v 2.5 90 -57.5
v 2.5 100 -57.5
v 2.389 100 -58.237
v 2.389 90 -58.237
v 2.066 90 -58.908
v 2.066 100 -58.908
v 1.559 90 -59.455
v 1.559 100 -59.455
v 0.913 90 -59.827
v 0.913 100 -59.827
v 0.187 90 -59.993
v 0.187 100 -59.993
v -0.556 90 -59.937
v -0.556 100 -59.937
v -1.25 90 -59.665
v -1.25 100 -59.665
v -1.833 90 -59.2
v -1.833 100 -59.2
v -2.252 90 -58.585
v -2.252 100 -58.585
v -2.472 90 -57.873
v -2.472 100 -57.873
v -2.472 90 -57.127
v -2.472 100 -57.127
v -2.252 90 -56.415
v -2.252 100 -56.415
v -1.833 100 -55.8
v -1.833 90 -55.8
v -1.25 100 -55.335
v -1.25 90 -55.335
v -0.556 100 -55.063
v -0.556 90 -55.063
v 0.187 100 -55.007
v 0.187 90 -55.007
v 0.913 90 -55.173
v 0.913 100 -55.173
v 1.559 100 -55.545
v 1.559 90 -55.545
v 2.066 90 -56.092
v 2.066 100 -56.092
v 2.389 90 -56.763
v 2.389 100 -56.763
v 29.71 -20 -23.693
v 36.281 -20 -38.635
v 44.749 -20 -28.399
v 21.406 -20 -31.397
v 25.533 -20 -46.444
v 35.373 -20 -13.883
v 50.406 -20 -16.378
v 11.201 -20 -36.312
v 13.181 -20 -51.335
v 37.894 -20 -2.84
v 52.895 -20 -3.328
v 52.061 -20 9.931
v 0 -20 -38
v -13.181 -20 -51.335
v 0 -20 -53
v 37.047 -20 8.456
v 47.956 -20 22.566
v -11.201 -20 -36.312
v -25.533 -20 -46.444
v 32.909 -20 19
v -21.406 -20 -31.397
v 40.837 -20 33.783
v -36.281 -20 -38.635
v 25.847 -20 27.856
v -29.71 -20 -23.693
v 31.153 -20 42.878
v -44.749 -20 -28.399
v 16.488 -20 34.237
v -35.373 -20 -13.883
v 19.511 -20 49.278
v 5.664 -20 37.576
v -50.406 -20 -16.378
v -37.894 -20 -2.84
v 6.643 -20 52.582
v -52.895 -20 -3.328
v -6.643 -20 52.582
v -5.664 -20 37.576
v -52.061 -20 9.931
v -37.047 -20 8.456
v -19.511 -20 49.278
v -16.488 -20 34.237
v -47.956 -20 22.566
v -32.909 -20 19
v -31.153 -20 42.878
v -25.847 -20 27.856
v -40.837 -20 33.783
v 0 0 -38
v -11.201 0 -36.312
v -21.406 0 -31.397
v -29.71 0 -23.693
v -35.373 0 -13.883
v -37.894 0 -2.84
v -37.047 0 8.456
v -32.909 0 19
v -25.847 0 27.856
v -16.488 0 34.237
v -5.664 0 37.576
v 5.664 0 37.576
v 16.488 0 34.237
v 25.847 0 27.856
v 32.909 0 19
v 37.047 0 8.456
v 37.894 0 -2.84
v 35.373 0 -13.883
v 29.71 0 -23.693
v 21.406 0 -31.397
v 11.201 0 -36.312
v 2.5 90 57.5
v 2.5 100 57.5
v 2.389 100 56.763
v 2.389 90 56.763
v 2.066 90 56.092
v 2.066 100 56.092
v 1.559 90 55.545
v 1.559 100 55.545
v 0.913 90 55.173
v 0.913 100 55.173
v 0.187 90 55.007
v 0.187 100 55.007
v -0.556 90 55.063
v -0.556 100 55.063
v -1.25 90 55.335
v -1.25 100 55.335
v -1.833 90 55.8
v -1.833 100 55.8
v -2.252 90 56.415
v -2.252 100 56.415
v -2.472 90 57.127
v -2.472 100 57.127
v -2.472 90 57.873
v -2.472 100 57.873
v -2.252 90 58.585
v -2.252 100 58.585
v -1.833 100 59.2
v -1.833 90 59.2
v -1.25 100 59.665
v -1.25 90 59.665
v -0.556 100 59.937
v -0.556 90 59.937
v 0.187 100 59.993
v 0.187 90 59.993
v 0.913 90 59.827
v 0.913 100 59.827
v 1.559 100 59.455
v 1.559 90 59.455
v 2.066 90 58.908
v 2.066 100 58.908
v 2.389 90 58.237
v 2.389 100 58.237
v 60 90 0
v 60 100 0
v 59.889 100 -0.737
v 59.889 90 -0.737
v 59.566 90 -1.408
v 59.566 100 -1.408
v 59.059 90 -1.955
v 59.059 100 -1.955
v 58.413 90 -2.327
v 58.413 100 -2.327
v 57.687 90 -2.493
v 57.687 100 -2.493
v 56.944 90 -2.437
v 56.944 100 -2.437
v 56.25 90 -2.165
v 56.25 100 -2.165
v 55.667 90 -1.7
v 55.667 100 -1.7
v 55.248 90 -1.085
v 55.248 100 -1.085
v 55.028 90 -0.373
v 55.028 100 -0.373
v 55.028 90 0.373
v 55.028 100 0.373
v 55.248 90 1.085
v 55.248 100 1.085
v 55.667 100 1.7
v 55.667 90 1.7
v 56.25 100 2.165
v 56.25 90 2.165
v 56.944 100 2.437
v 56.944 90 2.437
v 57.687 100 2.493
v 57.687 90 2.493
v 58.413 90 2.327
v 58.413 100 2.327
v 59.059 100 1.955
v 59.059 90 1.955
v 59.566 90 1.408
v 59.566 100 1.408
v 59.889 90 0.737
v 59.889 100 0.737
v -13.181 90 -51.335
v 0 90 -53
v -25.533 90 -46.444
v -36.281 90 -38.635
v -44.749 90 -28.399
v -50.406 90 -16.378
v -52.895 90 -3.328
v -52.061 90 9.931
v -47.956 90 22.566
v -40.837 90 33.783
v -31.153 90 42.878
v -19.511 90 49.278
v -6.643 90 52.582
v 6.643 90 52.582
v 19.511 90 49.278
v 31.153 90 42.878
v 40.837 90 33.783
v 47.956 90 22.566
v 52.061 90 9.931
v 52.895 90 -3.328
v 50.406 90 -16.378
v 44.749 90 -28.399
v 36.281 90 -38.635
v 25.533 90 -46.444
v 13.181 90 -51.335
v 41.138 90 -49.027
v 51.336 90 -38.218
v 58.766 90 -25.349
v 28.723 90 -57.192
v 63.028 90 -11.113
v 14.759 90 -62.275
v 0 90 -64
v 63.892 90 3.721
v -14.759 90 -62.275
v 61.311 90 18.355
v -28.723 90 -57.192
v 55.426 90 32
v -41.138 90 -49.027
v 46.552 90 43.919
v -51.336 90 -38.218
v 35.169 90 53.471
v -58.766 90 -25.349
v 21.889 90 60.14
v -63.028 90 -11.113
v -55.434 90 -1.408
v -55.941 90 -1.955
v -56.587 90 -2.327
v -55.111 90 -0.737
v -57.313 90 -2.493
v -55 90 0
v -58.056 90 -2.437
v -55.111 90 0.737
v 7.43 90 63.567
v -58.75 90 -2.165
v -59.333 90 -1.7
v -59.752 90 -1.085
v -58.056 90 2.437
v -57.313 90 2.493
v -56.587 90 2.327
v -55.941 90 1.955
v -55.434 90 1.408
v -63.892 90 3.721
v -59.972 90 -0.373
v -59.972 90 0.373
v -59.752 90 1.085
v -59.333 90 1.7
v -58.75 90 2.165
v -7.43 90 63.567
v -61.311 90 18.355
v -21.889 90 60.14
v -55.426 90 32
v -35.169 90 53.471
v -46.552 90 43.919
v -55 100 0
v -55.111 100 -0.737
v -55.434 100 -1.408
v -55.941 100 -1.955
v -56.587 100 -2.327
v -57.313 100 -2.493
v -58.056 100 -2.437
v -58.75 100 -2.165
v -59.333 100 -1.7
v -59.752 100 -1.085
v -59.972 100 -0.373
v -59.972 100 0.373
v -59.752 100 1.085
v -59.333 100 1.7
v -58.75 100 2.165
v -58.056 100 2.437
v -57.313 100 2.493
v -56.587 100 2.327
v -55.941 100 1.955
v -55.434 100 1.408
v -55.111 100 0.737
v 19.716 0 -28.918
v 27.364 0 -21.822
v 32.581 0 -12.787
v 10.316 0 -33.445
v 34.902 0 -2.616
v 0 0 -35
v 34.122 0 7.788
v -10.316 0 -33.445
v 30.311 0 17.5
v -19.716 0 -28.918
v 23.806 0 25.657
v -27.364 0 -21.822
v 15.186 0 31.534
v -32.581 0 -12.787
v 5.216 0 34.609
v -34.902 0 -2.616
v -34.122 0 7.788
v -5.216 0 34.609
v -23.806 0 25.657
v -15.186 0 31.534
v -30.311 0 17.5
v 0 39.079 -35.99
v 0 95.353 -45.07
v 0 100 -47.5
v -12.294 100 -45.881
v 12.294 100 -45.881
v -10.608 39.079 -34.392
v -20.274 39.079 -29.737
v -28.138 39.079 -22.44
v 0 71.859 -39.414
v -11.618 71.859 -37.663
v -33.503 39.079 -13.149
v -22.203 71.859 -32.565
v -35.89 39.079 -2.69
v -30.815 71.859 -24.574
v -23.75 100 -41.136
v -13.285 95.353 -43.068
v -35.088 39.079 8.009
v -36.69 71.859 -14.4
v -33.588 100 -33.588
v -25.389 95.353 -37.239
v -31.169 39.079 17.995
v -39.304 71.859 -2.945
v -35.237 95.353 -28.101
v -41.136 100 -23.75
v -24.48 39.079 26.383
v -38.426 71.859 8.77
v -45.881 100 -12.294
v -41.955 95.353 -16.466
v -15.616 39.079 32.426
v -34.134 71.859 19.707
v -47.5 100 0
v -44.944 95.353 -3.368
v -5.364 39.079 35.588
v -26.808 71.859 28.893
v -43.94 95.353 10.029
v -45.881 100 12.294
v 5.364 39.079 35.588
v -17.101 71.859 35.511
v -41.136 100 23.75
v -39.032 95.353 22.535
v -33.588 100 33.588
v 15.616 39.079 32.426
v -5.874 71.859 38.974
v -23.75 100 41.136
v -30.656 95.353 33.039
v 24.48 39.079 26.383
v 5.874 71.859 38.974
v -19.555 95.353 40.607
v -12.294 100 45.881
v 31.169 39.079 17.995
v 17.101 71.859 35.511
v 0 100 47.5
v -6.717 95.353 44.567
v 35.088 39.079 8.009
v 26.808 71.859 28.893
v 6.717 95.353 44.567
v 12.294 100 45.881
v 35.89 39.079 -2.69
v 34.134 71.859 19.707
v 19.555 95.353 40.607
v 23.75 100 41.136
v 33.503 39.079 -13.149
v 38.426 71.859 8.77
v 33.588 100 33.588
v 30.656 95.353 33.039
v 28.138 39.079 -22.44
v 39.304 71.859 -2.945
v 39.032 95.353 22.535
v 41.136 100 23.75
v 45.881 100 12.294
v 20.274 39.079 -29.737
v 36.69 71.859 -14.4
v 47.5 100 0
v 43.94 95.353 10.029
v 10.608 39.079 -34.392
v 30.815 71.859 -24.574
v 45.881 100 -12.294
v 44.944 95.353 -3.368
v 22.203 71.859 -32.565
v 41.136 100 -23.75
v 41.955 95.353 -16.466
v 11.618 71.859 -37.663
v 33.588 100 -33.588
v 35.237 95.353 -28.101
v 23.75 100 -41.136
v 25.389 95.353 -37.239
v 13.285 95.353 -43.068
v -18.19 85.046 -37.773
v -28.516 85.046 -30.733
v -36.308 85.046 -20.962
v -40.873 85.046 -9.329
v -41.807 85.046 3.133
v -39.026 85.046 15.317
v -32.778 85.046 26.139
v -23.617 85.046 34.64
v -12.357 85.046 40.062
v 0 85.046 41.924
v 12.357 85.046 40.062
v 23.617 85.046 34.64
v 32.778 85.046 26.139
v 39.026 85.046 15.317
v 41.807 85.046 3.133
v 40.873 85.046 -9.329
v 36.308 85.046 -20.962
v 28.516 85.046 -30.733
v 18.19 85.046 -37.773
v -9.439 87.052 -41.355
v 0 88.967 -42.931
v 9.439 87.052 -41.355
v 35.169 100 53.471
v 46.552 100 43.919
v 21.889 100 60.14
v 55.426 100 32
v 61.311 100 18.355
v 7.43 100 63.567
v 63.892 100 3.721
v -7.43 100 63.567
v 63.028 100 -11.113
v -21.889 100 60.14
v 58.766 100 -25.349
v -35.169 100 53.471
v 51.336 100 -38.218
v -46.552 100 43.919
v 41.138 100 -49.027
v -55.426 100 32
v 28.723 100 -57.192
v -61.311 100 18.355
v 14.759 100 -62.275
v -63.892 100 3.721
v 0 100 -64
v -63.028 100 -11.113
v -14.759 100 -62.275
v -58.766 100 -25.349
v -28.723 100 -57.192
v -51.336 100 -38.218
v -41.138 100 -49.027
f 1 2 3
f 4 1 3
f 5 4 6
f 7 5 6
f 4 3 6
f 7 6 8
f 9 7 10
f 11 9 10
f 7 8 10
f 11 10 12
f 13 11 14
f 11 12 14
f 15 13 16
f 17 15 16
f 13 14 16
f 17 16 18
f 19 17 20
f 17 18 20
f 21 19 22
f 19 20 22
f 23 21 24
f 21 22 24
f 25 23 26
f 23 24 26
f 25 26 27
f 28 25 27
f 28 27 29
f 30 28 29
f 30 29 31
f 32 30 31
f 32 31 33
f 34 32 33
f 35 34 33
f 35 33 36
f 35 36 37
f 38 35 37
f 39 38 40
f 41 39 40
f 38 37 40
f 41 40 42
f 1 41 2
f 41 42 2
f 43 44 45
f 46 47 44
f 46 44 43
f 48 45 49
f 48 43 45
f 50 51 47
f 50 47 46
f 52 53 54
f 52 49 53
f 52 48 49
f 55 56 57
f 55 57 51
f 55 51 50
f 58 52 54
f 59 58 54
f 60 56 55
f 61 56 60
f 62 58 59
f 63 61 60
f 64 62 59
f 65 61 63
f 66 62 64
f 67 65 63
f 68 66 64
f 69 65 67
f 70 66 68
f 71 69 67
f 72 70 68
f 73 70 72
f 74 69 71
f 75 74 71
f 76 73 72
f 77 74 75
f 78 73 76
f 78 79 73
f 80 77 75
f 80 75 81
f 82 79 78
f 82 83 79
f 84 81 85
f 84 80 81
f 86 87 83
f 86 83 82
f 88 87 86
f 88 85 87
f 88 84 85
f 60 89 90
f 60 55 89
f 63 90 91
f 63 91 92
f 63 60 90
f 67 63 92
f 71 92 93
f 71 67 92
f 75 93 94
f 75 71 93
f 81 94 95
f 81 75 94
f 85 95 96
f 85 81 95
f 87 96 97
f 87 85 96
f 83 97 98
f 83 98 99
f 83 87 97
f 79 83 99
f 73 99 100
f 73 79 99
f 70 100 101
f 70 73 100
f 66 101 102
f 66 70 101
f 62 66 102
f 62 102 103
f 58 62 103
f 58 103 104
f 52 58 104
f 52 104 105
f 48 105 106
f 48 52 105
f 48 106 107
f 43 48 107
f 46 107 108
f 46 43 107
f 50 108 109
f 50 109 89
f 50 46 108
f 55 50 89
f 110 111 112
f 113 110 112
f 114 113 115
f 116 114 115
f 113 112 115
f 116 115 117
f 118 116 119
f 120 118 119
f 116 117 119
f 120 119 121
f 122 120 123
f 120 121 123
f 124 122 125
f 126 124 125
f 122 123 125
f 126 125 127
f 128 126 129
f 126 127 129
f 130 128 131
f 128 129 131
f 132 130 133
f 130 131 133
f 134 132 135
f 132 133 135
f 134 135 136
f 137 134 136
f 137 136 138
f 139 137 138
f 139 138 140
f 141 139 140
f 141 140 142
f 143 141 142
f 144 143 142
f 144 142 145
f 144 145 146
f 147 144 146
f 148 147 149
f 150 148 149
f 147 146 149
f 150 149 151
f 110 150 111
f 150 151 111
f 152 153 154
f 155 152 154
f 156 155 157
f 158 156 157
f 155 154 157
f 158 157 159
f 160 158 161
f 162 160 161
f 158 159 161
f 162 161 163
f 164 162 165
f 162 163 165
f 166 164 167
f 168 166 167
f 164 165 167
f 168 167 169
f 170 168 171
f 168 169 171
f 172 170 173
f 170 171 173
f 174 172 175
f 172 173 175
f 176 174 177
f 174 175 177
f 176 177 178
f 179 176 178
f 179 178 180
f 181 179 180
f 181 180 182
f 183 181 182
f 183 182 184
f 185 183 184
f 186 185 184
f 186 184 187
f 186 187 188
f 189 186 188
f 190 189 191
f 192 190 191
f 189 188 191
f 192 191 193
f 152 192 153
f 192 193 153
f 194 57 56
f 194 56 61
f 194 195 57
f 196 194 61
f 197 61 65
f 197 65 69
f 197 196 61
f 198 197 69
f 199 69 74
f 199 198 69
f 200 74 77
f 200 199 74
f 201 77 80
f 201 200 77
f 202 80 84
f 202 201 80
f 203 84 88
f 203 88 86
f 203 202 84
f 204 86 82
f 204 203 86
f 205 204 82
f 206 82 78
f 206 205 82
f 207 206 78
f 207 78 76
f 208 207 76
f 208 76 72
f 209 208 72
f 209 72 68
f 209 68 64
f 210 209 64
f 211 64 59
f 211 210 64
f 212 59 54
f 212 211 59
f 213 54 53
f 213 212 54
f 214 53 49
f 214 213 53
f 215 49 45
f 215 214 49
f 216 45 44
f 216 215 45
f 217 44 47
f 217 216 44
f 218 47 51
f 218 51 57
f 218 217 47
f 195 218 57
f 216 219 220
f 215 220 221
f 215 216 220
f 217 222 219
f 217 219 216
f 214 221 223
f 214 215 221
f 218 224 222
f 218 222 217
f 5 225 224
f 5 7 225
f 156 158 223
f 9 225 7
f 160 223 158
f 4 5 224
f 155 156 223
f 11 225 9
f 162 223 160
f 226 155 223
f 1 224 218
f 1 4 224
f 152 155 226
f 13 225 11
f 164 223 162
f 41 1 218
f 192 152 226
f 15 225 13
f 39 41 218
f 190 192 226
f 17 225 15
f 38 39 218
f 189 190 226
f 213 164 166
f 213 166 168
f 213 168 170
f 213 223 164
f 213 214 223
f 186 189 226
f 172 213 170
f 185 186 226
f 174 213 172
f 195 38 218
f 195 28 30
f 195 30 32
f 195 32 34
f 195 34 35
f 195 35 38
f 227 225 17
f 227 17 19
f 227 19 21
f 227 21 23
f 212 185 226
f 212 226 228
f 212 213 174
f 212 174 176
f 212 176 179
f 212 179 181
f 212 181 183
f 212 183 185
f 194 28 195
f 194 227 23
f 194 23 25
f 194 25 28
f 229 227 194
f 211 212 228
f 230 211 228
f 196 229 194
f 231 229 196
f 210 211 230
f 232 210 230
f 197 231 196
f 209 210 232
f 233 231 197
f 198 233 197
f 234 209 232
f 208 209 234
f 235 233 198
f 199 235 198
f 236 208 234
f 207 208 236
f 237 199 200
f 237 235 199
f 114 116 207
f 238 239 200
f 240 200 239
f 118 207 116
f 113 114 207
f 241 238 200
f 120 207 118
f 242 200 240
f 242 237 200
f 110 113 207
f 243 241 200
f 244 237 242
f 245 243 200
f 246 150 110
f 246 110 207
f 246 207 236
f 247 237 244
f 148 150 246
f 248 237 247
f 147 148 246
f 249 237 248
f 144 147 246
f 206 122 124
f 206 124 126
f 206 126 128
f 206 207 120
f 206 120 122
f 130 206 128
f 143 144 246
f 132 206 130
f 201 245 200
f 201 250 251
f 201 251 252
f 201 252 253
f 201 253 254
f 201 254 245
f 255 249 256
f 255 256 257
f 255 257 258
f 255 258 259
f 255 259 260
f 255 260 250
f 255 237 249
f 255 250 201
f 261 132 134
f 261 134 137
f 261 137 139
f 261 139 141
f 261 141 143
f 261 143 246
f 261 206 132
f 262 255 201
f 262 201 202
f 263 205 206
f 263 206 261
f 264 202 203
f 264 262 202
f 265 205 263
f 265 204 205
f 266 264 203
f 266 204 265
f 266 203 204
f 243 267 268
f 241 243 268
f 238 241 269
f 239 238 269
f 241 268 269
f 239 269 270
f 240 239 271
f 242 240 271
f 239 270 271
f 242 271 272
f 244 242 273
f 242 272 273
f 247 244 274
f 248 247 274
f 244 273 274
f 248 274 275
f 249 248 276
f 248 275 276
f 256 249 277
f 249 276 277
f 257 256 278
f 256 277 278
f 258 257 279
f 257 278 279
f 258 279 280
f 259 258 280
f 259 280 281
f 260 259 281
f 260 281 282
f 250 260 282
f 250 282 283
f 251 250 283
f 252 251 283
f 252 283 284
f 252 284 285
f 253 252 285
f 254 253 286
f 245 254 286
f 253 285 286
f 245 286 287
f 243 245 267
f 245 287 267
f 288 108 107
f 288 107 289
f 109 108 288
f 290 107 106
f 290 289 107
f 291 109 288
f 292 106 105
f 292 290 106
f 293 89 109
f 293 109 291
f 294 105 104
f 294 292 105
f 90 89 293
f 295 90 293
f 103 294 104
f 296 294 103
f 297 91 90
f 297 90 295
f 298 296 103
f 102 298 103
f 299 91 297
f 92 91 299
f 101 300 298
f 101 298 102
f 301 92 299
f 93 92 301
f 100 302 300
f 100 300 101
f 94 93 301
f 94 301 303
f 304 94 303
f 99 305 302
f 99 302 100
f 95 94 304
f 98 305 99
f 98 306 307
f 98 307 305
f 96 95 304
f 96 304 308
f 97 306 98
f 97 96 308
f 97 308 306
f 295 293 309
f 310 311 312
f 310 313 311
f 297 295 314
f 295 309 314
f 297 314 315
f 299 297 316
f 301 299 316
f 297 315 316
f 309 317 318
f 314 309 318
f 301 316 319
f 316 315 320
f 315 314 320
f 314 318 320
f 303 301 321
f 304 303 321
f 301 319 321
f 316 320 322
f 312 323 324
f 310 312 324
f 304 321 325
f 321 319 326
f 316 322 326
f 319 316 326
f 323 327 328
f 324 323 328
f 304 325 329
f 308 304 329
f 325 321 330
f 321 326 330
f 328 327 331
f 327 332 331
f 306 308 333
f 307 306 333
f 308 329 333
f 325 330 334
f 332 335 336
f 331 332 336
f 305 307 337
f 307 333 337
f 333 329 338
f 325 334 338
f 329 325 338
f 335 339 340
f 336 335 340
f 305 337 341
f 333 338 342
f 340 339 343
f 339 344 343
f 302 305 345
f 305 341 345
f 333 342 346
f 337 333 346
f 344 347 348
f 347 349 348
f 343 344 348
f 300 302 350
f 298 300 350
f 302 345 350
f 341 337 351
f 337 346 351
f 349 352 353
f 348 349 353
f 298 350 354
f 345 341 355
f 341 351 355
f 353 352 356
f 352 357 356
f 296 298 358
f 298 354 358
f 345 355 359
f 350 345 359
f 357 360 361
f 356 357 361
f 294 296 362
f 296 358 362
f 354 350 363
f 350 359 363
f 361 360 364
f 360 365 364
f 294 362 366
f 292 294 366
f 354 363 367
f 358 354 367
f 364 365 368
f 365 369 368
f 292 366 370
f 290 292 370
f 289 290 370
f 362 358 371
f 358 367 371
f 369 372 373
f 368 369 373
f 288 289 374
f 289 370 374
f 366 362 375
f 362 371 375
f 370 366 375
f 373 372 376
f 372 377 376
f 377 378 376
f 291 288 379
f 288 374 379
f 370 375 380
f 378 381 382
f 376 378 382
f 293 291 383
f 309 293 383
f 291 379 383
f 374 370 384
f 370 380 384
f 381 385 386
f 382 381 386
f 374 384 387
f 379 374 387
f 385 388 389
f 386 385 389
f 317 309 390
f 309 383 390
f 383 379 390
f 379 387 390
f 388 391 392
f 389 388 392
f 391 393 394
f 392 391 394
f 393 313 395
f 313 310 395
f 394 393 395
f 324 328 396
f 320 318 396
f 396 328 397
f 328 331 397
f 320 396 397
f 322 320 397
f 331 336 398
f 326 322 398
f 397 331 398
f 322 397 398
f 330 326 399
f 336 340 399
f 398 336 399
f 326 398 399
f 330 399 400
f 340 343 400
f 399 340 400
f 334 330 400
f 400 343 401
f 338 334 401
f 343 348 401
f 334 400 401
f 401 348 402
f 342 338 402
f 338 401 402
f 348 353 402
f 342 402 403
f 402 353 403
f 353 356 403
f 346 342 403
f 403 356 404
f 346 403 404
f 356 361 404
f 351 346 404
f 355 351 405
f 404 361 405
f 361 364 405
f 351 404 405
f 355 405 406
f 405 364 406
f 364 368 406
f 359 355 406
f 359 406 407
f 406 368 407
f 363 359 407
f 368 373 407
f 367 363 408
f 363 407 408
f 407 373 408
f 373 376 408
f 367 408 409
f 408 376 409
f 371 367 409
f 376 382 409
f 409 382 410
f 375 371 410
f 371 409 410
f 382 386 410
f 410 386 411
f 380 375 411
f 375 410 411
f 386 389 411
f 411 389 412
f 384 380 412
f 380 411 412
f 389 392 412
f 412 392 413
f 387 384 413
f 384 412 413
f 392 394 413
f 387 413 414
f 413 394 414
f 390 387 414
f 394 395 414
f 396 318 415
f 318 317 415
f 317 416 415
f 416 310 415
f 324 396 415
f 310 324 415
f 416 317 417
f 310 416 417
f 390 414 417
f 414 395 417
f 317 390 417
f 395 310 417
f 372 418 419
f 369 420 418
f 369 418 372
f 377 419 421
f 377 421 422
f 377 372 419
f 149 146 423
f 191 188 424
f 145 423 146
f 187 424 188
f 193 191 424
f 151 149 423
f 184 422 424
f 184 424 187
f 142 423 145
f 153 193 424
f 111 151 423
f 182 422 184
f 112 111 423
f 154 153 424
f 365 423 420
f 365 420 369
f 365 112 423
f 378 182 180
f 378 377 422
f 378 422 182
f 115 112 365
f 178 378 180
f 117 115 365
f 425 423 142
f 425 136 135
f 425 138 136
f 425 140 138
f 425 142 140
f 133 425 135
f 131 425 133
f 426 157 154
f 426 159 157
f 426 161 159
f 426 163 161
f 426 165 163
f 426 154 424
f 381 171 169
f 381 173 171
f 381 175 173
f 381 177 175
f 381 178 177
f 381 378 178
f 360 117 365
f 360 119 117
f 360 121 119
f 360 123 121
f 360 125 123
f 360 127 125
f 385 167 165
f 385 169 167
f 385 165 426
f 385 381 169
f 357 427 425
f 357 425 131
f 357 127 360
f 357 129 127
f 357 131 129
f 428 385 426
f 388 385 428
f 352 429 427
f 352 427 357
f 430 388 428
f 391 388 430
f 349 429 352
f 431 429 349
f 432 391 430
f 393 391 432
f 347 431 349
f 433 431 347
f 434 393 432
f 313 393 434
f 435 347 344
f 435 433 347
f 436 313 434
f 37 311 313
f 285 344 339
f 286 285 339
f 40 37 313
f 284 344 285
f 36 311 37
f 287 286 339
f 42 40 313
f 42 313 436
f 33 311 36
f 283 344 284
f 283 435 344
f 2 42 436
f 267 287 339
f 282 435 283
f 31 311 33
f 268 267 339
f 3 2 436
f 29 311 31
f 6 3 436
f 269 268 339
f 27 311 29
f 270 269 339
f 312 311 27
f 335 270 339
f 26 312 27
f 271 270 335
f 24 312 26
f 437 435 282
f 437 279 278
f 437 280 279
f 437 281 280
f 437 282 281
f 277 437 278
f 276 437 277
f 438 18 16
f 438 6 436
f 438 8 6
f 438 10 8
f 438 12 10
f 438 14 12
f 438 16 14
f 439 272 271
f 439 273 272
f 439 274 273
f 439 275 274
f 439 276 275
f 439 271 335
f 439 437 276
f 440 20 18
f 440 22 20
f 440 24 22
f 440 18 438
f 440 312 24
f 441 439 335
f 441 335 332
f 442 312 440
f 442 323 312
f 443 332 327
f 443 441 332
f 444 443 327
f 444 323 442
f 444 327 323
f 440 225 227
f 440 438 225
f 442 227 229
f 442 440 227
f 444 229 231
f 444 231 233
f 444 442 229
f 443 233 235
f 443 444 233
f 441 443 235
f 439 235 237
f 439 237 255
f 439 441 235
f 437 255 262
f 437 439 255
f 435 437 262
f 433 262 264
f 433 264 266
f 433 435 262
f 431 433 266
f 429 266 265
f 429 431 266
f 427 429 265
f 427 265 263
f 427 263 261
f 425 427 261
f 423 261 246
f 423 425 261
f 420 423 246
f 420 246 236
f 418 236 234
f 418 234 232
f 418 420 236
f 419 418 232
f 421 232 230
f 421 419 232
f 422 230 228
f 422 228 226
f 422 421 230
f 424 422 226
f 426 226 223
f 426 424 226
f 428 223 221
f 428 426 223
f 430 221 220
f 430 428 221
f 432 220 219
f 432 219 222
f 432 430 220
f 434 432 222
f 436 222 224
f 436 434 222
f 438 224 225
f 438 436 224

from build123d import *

# Parameters (mm, degrees)
SKETCH3_R          = 2.5
CUT_EXTRUDE1_DEPTH = 10


with BuildPart() as part:
    # Sketch1 → Revolve2 (revolve)
    with BuildSketch(Plane(origin=(0, 0, 0), x_dir=(0, 0, -1), z_dir=(1, 0, 0))):
        with BuildLine():
            Line((35, 0), (38, 0))
            Line((38, 0), (38, -20))
            Line((38, -20), (53, -20))
            Line((53, -20), (53, 90))
            Line((53, 90), (56.634888803, 90))
            Line((56.634888803, 90), (64, 90))
            Line((64, 90), (64, 100))
            Line((64, 100), (47.5, 100))
            add(Edge.make_bspline(
                [(35, 0), (35, 0.743462171), (35.036045174, 3.604263203), (34.55519496, 30.18748809), (38.452213163, 87.123824556), (47.5, 100)],
                knots=[0, 0, 0, 0, 0.040283917, 0.140283917, 1, 1, 1, 1], degree=3))
        make_face()
    revolve(axis=Axis((0, 0, 0), (0, 1, 0)))

    # Sketch3 → Cut-Extrude1 (cut)
    with BuildSketch(Plane(origin=(0, 100, 0), x_dir=(1, 0, 0), z_dir=(0, 1, 0))):
        with Locations((0, 57.5)):
            Circle(SKETCH3_R)
        with Locations((57.5, 0)):
            Circle(SKETCH3_R)
        with Locations((0, -57.5)):
            Circle(SKETCH3_R)
        with Locations((-57.5, 0)):
            Circle(SKETCH3_R)
    extrude(amount=-CUT_EXTRUDE1_DEPTH, mode=Mode.SUBTRACT)


solid = part.part
